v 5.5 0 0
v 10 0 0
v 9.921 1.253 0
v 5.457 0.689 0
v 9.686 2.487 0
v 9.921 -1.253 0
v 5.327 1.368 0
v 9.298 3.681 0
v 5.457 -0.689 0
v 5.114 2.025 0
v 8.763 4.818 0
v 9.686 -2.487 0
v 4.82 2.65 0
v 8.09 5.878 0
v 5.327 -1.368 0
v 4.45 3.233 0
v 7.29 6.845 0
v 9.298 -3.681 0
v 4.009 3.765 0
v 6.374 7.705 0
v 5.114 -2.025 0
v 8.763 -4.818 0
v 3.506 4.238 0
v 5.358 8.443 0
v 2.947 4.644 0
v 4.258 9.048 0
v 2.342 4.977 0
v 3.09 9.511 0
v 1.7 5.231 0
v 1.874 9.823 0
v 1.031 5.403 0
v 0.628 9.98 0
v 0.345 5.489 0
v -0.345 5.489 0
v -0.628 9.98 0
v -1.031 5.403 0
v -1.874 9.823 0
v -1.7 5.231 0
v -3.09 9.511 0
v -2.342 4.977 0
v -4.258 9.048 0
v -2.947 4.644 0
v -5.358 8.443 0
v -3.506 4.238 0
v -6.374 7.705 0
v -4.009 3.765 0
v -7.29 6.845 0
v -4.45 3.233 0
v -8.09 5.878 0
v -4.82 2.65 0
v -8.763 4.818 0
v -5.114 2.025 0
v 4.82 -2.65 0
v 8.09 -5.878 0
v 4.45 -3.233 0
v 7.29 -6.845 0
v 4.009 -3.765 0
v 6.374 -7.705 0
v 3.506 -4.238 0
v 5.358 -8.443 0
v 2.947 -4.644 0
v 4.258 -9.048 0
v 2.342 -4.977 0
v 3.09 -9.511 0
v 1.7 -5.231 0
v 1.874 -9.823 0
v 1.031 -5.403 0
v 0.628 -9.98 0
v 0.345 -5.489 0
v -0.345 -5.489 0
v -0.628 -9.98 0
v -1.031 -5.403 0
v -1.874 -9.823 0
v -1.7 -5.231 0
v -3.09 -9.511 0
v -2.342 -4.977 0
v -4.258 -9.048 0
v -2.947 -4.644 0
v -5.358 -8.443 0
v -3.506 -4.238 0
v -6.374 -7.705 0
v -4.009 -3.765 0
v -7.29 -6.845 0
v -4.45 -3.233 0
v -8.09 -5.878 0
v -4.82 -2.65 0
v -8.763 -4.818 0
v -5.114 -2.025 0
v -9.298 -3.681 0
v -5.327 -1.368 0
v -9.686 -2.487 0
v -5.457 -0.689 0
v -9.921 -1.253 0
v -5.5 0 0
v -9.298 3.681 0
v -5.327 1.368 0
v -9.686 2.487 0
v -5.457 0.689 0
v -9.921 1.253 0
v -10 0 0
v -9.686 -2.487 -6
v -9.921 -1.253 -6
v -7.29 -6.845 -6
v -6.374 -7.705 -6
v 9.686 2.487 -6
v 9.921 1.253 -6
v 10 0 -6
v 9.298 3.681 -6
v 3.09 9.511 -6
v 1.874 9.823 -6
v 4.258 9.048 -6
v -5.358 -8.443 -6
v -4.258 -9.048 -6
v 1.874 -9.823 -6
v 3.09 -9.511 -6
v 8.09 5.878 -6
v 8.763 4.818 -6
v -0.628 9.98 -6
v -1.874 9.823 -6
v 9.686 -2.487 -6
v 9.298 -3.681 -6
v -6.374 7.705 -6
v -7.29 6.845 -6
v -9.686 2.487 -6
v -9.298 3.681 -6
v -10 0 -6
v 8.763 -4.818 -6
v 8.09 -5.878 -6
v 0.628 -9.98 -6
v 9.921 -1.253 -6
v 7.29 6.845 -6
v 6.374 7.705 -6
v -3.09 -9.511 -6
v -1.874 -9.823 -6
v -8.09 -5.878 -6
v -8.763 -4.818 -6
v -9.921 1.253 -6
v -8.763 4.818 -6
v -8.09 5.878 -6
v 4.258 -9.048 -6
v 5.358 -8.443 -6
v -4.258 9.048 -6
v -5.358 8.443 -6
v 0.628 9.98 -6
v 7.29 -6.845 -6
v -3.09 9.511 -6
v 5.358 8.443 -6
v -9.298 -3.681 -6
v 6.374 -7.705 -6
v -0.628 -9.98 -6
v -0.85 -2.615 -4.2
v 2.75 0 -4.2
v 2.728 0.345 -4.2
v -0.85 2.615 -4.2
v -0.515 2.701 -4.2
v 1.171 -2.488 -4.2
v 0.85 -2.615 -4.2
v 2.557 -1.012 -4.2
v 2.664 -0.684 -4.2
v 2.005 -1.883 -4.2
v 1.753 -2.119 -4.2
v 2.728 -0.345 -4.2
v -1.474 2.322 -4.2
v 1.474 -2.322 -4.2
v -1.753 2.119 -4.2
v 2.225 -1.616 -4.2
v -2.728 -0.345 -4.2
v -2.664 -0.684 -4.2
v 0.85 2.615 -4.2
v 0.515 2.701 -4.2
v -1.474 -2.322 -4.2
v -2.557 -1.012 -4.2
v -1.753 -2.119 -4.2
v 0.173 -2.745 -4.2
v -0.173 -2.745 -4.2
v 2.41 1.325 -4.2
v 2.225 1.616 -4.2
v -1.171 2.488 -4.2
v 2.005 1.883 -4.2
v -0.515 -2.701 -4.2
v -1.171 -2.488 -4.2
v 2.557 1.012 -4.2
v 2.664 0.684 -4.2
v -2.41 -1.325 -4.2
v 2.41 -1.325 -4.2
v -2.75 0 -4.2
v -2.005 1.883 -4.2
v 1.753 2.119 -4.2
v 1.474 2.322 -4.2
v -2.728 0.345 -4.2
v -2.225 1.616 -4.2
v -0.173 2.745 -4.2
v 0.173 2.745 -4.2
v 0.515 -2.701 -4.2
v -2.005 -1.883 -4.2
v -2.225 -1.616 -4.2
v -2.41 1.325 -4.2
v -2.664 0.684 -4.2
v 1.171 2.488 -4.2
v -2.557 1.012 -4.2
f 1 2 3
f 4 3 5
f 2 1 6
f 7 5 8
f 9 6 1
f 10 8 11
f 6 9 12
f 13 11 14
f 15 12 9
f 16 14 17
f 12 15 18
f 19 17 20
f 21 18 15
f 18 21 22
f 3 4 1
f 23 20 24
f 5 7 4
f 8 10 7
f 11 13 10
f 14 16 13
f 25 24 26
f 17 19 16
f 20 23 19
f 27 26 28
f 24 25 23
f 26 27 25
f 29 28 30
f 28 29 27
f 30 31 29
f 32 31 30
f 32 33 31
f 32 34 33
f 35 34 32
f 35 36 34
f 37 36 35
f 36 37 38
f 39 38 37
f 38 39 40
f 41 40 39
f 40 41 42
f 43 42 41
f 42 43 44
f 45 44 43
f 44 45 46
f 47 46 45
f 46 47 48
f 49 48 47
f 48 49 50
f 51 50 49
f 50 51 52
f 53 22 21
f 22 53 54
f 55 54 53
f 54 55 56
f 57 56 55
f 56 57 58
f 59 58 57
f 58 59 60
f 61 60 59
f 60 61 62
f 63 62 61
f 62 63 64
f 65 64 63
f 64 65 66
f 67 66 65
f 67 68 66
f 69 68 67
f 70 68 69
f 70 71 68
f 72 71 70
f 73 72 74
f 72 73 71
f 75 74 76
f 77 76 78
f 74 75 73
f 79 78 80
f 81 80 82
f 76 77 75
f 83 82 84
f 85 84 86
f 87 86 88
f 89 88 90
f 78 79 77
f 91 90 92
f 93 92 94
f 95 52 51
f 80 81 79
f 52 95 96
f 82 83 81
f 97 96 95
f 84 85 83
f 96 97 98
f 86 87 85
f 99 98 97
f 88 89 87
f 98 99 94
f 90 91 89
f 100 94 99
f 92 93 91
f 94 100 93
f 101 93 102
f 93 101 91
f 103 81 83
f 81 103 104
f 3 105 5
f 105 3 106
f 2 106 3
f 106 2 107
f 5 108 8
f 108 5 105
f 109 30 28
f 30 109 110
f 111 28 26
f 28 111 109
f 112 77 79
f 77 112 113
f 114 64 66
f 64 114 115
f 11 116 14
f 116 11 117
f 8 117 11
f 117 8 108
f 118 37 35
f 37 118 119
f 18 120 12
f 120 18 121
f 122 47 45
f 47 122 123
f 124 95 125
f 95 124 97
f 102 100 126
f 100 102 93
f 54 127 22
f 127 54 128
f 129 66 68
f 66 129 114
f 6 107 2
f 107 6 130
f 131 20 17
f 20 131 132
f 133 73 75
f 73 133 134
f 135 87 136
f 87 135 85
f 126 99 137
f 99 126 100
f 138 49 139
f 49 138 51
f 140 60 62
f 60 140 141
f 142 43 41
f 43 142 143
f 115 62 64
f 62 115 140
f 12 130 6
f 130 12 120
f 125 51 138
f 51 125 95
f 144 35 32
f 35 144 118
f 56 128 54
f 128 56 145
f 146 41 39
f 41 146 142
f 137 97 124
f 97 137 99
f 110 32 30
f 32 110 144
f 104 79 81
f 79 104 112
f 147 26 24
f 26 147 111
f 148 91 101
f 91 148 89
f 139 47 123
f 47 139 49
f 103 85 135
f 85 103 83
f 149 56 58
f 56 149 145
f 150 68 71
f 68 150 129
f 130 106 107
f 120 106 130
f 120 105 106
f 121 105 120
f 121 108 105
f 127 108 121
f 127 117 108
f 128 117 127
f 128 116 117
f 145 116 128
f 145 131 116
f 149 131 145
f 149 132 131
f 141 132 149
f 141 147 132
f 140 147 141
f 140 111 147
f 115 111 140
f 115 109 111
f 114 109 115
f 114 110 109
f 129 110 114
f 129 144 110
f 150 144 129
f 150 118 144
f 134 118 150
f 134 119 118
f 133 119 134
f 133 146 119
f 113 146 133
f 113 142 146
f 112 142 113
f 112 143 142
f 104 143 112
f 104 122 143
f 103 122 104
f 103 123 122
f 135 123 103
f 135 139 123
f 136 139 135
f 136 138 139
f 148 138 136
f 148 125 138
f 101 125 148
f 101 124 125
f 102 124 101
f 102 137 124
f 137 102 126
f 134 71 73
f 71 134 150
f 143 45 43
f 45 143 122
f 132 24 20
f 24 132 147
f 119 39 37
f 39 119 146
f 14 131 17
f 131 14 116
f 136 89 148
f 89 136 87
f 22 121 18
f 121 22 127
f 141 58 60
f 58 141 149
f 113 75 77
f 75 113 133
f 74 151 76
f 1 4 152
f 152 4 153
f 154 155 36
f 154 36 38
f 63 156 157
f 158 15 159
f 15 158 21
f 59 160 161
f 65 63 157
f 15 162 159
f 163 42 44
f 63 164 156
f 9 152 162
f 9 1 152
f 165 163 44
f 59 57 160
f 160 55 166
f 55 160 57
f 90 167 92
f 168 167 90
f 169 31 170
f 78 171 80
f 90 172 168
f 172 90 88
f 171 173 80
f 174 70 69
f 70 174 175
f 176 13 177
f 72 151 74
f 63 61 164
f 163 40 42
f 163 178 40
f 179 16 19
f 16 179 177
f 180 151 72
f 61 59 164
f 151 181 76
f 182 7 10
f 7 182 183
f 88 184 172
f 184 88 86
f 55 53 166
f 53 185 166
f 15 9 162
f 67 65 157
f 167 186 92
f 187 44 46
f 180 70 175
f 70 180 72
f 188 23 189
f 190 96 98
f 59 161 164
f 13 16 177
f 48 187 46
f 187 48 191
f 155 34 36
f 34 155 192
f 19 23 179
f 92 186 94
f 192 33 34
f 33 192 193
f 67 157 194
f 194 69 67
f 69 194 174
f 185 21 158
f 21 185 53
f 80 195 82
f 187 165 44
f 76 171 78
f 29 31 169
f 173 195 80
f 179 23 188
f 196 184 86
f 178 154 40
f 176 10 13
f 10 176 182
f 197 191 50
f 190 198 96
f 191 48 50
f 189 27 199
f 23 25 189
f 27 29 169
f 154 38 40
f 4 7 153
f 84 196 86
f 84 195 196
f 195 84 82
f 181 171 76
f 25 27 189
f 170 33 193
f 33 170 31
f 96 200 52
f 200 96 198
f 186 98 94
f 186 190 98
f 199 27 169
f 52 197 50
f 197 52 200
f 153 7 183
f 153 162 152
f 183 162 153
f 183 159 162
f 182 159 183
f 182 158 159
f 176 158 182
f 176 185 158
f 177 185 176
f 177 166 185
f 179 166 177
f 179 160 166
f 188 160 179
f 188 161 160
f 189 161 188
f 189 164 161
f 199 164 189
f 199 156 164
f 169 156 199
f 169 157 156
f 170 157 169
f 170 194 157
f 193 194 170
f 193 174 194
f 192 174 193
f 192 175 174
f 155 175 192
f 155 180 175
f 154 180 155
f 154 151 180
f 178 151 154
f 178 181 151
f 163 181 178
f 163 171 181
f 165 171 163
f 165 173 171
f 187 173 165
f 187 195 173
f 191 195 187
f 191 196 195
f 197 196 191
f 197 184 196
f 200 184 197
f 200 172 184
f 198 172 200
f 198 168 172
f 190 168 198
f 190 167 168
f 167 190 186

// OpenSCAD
$fn = 50;


difference() {
	union() {
		translate(v = [0, 0, -3.0000000000]) {
			cylinder(h = 3, r = 7.0000000000);
		}
		translate(v = [0, 0, -6.0000000000]) {
			cylinder(h = 6, r = 10.0000000000);
		}
	}
	union() {
		translate(v = [0, 0, 0]) {
			rotate(a = [0, 0, 0]) {
				difference() {
					union() {
						#translate(v = [0, 0, -3.0000000000]) {
							cylinder(h = 3, r = 2.2500000000);
						}
						#translate(v = [0, 0, -4.2000000000]) {
							cylinder(h = 4.2000000000, r = 7.0000000000, r1 = 2.7500000000, r2 = 5.5000000000);
						}
						#translate(v = [0, 0, -3.0000000000]) {
							cylinder(h = 3, r = 2.7500000000);
						}
						#translate(v = [0, 0, -3.0000000000]) {
							cylinder(h = 3, r = 2.2500000000);
						}
					}
					union();
				}
			}
		}
	}
}
